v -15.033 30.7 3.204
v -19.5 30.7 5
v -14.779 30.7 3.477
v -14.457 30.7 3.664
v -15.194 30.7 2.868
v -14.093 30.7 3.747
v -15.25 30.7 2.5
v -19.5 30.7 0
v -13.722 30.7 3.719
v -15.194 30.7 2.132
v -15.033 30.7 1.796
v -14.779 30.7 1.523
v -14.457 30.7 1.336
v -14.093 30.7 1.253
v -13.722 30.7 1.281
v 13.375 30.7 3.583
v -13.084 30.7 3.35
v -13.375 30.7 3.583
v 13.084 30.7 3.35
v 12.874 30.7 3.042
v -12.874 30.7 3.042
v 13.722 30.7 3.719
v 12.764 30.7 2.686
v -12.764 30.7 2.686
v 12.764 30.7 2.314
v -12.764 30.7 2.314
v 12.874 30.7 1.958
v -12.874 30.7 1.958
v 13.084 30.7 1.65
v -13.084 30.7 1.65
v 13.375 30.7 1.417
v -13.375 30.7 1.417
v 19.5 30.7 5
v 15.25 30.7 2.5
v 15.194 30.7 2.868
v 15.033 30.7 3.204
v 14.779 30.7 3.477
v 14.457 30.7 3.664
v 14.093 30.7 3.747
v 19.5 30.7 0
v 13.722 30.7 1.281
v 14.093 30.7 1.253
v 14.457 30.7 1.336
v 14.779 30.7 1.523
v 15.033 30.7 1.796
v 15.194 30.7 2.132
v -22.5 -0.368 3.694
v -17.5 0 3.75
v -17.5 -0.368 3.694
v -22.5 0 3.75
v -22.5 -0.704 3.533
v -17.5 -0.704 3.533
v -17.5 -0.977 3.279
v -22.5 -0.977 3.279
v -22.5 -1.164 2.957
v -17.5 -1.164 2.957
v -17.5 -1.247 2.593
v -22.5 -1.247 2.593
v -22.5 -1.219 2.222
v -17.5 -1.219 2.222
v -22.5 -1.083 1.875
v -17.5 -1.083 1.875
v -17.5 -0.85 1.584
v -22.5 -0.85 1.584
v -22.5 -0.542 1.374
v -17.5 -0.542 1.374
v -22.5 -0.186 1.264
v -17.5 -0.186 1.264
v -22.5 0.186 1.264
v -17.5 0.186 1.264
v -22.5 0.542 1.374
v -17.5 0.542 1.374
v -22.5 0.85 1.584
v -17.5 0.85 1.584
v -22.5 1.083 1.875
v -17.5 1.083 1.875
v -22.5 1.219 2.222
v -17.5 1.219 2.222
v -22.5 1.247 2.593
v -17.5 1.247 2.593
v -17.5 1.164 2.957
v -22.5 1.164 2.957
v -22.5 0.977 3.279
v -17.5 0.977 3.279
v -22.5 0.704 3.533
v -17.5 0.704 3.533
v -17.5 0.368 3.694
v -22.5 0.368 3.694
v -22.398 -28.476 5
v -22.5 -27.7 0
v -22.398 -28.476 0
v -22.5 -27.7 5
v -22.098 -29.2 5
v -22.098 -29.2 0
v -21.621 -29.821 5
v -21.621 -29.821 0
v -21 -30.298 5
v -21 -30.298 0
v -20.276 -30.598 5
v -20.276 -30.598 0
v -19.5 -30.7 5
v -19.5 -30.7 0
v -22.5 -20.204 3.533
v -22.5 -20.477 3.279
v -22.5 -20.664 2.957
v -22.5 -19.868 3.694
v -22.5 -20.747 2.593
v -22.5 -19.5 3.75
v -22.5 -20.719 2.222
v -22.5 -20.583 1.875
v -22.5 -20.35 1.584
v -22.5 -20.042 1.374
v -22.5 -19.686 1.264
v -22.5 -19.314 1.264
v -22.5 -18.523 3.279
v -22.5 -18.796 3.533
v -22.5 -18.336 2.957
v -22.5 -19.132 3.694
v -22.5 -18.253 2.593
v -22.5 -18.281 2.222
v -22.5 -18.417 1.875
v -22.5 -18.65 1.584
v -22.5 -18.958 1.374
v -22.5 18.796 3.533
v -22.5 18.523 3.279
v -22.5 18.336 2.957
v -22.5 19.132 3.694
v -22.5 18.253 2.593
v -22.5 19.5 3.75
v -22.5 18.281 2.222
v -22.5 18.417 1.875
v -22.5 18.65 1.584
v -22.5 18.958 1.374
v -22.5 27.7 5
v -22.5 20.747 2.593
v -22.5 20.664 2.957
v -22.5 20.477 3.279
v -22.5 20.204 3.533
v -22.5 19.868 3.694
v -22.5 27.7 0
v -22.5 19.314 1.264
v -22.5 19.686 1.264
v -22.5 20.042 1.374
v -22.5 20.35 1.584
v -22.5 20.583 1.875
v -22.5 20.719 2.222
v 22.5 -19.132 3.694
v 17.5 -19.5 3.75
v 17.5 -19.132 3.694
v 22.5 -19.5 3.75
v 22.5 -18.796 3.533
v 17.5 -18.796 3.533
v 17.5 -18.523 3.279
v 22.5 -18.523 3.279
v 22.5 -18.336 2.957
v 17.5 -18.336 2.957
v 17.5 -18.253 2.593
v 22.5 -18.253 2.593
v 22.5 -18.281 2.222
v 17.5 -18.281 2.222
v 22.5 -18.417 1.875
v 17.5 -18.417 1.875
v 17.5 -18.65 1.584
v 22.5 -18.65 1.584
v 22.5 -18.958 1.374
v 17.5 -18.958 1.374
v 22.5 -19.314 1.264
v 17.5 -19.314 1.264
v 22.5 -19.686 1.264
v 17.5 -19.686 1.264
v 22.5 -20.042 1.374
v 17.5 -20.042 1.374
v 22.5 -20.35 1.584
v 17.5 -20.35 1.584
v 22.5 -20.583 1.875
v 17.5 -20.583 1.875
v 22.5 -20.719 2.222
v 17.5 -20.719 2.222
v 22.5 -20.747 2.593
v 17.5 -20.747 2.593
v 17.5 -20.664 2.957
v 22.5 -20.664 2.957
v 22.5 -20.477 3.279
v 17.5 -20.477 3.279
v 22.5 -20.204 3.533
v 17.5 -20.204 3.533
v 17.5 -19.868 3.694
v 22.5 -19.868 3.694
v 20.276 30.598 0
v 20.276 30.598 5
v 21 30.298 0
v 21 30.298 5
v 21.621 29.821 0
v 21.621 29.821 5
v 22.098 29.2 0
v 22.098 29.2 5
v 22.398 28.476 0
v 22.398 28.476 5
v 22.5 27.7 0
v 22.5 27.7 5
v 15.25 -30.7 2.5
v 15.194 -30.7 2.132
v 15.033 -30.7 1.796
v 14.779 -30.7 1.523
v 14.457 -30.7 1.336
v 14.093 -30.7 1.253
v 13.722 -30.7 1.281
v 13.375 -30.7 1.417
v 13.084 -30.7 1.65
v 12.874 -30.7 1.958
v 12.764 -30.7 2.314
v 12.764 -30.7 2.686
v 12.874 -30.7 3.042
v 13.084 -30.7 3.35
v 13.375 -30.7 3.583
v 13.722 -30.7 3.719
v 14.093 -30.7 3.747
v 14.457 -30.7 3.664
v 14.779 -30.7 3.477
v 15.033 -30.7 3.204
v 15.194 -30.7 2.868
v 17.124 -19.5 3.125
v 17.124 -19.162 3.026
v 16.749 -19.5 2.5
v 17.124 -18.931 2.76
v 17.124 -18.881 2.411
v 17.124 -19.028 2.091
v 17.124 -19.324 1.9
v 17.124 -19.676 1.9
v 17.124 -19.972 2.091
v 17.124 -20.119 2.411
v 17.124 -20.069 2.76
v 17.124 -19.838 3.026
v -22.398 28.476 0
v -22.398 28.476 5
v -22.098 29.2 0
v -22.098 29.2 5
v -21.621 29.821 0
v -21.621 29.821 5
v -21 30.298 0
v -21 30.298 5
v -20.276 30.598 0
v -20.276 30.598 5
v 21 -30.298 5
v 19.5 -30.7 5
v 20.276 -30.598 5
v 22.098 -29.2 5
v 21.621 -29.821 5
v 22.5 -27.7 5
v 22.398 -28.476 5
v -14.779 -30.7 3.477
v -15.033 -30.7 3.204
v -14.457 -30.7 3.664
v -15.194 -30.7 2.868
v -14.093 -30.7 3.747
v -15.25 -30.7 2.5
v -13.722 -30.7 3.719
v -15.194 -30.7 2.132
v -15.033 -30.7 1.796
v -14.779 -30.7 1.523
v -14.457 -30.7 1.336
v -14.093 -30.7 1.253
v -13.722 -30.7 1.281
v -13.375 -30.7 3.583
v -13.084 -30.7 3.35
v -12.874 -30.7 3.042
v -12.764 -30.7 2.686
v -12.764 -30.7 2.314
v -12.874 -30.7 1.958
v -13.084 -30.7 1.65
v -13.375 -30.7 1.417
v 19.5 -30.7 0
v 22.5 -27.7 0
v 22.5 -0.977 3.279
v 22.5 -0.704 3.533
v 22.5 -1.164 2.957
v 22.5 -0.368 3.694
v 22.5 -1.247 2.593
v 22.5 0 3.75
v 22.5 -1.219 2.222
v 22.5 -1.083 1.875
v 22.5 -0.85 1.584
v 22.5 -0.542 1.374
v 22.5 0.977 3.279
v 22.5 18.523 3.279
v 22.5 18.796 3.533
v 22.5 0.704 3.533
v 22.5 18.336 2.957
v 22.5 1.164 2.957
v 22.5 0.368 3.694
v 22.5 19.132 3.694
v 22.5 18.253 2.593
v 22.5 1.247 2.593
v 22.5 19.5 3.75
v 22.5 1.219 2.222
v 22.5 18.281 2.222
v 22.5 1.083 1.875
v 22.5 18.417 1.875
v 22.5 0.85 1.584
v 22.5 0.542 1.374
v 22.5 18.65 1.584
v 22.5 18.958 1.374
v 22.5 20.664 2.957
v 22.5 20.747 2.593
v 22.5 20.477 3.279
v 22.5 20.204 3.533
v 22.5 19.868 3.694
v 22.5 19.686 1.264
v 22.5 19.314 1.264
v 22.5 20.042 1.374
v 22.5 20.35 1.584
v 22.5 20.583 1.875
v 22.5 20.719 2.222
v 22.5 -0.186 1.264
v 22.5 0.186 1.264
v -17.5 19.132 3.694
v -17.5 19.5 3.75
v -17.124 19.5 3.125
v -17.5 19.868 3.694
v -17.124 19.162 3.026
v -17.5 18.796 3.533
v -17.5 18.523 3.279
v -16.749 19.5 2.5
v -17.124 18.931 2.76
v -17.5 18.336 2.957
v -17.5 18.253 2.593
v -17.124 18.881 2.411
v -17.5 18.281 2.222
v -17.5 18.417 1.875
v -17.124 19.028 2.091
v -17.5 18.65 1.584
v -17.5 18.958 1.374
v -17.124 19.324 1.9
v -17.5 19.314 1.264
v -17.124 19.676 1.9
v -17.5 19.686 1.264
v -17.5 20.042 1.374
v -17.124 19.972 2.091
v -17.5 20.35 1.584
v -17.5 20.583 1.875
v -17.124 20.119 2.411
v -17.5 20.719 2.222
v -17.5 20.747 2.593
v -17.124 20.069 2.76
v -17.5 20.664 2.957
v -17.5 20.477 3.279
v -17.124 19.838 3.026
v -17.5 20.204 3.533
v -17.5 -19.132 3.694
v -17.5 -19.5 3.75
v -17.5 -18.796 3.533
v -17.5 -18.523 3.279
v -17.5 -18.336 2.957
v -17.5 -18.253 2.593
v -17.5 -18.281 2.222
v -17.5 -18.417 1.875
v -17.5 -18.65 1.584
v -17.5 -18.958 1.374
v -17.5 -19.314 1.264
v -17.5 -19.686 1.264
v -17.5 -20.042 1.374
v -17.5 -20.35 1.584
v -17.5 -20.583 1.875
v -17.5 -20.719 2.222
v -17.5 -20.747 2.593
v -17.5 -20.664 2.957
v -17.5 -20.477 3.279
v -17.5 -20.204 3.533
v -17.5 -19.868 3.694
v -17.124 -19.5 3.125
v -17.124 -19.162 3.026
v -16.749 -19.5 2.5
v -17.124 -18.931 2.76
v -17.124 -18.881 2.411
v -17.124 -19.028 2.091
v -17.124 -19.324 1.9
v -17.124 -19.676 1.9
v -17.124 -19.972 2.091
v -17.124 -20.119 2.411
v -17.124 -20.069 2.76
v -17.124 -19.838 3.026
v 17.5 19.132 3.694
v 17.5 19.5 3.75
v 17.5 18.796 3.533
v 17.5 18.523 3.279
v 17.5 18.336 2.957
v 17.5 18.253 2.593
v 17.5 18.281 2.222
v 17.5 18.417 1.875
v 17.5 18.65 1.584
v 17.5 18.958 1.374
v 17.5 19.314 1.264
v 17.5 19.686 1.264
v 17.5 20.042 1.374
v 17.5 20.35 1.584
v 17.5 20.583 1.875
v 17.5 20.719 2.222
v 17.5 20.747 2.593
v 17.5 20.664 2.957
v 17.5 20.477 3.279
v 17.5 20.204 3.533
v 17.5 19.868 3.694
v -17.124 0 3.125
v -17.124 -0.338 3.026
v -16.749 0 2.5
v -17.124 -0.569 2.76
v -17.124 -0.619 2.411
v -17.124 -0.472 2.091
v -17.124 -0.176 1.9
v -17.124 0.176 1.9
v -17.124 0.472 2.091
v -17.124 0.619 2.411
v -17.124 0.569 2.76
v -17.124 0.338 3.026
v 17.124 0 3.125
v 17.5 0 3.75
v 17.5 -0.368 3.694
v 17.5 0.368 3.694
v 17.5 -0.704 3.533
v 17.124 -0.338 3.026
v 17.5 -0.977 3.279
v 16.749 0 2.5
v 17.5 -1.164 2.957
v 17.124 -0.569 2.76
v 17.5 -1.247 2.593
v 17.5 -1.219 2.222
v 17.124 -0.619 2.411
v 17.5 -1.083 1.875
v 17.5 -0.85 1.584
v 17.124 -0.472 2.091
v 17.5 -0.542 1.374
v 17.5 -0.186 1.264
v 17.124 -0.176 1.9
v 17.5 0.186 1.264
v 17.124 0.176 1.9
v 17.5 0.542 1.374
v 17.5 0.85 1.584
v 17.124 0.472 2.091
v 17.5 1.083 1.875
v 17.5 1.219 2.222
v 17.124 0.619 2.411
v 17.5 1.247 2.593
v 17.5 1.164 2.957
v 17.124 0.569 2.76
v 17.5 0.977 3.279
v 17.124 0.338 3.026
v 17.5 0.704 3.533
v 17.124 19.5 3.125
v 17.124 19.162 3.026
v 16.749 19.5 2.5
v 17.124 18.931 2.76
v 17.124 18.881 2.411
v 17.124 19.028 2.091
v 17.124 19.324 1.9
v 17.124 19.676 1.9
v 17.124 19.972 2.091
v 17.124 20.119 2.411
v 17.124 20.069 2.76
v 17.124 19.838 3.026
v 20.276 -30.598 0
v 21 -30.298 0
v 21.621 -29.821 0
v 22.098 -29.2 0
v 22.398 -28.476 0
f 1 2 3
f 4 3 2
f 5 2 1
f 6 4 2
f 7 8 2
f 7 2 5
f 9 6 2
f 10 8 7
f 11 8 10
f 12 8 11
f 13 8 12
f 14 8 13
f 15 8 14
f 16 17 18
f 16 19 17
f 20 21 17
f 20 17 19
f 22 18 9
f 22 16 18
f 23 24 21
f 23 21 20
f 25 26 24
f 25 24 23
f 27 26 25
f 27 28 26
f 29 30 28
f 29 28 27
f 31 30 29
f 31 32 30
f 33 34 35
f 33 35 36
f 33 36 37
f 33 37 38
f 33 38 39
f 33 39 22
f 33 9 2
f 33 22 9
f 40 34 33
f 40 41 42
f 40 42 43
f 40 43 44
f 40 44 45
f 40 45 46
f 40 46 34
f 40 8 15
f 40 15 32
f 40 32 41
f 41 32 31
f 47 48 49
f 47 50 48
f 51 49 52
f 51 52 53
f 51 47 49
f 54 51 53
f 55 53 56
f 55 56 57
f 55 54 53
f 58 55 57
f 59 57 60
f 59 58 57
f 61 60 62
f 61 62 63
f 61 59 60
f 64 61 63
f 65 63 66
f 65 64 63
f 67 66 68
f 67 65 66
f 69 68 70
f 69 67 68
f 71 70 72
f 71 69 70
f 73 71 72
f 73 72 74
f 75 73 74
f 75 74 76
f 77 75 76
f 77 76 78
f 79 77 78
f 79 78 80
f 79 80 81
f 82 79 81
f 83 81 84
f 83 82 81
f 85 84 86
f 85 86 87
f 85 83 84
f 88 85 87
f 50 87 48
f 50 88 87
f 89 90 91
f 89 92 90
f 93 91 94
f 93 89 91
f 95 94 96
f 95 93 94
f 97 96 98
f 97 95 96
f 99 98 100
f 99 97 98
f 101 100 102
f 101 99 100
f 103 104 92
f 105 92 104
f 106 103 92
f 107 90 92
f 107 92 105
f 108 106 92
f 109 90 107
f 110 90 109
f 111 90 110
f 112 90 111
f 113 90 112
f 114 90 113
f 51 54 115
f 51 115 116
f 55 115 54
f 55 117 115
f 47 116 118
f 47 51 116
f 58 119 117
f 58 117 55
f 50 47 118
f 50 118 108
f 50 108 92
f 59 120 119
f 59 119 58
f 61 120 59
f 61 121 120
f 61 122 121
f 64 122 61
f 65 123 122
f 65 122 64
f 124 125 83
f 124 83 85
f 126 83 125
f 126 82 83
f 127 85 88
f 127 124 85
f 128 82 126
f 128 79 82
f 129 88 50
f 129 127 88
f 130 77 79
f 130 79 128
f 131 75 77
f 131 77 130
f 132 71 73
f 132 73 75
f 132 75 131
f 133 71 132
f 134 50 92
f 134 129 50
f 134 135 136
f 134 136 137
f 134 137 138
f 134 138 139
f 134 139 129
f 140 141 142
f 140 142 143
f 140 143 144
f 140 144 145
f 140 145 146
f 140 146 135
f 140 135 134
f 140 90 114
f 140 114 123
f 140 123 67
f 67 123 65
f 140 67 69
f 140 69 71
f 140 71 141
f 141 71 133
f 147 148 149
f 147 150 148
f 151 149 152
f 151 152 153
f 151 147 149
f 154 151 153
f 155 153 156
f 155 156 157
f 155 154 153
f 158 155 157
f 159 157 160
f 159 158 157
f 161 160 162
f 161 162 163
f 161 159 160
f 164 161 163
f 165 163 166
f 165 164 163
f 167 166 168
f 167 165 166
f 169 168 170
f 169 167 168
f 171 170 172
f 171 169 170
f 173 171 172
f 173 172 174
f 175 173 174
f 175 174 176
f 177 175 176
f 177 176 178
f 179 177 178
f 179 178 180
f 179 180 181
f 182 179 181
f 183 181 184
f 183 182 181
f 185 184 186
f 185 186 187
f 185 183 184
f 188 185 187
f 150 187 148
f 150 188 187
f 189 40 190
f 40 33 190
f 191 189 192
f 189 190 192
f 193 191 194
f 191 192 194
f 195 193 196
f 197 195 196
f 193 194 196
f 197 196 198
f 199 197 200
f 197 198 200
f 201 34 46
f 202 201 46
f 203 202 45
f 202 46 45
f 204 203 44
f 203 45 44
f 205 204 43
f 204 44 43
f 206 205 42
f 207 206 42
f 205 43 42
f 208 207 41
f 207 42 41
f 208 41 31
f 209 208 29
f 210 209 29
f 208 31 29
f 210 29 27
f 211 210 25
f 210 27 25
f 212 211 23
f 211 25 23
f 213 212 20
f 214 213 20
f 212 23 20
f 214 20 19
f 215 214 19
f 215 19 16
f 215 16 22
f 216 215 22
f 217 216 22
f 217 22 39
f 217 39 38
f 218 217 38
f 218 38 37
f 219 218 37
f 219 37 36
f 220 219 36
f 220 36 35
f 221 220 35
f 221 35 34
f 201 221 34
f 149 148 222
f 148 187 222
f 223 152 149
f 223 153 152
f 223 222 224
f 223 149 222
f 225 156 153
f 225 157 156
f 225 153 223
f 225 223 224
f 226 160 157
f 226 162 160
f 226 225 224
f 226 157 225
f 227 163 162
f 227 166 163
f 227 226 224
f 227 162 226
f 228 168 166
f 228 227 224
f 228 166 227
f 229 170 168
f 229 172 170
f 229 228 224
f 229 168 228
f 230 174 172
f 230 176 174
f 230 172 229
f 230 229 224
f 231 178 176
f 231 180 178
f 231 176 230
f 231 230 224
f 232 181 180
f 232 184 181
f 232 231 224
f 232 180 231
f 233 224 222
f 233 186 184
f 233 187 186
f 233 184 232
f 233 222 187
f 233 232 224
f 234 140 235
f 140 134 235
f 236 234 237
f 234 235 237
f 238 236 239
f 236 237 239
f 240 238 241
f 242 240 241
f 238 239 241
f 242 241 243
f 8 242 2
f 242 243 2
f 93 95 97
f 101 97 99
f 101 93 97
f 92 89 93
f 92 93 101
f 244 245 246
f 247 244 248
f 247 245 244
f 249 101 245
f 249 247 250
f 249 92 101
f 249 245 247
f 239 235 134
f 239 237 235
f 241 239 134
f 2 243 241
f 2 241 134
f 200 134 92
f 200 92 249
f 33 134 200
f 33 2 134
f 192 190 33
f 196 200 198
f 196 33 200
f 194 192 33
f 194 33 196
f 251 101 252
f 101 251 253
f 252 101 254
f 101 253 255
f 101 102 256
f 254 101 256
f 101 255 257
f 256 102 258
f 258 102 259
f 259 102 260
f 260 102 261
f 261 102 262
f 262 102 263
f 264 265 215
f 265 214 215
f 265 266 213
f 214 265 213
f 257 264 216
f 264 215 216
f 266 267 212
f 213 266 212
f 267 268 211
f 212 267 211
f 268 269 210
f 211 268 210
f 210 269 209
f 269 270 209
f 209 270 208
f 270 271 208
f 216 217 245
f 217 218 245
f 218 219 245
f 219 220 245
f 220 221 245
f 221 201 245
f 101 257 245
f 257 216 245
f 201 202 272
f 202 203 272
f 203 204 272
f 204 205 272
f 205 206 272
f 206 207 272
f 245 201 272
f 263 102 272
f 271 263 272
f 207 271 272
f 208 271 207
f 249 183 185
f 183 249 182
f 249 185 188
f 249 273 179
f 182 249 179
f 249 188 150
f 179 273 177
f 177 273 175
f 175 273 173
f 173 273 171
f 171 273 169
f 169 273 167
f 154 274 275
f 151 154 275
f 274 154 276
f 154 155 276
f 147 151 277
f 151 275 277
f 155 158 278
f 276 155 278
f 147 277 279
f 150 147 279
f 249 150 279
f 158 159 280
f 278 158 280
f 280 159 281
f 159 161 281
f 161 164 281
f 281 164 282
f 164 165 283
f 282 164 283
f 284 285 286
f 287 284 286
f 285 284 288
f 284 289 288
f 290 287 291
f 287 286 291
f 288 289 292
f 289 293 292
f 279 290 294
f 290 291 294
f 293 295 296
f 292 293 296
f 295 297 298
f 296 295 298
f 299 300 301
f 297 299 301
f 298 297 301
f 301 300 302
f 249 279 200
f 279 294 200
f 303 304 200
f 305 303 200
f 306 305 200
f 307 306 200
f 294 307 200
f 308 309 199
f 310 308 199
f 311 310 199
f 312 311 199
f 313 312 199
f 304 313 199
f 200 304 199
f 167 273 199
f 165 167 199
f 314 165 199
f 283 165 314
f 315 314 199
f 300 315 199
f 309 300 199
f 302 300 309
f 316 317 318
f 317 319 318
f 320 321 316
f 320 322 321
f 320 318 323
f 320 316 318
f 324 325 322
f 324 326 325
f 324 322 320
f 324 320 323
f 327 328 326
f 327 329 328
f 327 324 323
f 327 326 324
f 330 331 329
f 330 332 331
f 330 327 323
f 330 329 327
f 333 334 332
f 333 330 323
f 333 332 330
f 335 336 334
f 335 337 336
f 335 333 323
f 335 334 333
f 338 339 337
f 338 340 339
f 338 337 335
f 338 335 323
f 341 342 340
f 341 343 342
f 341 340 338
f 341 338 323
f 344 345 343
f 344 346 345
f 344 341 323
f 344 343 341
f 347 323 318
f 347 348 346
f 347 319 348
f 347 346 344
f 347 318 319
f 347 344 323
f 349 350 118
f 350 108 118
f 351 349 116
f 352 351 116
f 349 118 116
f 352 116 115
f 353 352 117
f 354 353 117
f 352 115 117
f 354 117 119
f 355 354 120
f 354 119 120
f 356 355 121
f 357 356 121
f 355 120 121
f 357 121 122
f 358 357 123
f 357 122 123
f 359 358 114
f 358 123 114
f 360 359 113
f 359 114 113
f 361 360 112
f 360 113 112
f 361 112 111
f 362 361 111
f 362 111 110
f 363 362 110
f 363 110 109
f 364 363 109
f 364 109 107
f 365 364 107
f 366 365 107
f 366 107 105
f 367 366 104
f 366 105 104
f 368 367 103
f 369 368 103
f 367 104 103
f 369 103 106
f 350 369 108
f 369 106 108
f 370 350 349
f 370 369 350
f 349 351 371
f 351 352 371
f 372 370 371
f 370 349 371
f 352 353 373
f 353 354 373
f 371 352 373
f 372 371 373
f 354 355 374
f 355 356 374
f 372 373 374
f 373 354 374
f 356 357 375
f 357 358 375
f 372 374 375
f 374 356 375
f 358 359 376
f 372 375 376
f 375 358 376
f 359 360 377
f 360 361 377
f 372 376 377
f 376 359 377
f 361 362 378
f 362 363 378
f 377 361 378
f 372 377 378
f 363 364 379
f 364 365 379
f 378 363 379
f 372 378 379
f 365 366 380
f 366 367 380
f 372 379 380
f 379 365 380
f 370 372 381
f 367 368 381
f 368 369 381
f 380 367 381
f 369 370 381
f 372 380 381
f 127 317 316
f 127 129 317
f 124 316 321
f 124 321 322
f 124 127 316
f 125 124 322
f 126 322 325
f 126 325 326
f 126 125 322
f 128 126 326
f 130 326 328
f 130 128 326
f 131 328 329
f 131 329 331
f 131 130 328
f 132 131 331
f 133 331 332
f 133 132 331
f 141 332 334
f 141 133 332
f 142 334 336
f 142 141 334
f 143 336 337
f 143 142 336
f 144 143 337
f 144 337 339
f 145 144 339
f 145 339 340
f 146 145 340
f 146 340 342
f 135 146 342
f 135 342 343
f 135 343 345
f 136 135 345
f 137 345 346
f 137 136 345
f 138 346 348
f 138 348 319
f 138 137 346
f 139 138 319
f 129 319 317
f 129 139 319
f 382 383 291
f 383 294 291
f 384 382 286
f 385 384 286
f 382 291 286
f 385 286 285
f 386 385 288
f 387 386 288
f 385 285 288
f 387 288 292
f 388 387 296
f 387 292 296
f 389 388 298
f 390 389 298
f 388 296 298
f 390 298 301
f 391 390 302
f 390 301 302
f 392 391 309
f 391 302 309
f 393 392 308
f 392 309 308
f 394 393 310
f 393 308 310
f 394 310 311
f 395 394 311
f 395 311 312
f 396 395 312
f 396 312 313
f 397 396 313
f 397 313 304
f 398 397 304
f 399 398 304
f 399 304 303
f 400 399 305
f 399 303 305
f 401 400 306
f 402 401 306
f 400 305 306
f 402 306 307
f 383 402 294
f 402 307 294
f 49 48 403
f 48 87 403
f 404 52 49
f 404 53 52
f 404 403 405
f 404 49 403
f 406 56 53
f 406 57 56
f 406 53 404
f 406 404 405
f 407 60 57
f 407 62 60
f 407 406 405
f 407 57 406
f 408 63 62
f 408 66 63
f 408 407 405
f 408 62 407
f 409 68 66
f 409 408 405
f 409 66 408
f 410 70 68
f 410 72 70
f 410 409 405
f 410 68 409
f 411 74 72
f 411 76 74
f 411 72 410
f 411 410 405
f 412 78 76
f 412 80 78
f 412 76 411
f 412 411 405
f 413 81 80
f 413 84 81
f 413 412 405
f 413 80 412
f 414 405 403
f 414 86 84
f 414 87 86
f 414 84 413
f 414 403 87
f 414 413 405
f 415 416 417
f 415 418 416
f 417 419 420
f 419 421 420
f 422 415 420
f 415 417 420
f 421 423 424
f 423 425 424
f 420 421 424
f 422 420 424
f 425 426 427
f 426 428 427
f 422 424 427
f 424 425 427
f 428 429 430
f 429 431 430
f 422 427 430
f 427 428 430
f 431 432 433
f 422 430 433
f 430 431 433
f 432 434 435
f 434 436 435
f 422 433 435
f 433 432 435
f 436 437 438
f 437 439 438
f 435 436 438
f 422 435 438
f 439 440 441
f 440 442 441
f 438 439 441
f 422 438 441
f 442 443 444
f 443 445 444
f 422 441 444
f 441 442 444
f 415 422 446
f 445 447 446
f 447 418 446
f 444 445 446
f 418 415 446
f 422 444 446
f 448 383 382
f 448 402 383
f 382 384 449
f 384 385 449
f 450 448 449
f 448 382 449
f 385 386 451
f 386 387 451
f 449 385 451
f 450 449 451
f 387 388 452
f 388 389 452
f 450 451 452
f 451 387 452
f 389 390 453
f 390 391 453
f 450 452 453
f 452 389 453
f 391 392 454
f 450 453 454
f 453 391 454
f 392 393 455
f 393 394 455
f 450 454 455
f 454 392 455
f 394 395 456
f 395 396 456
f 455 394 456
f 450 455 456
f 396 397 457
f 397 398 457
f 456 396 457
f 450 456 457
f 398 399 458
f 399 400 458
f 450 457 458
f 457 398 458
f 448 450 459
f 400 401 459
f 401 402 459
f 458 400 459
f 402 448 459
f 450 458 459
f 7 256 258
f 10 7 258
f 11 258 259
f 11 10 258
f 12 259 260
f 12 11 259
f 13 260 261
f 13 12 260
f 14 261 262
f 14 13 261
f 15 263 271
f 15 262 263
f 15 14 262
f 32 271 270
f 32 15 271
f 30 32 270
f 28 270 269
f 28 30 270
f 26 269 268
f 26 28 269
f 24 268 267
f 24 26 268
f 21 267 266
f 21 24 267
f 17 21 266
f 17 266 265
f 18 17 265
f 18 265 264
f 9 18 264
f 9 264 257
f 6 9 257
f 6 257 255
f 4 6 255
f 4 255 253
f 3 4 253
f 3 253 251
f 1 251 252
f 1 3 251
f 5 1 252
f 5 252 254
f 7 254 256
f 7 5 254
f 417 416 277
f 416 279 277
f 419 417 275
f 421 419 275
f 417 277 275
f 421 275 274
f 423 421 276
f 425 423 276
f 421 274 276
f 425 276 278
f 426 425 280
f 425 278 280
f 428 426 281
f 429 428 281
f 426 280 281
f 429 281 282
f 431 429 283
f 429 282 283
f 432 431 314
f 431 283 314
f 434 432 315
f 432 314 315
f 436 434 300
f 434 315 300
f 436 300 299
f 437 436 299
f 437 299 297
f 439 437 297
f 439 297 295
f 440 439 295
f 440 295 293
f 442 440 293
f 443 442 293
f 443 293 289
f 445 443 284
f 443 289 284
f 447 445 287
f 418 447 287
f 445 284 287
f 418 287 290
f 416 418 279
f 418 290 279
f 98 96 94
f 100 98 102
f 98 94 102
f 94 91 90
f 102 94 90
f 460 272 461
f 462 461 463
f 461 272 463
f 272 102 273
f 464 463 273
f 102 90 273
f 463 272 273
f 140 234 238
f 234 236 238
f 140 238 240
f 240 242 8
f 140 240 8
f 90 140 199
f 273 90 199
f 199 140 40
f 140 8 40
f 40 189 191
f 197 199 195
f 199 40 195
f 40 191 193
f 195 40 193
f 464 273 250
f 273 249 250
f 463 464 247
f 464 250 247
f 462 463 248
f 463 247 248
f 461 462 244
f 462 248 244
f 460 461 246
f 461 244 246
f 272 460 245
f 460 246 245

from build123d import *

# Parameters (mm, degrees)
SKETCH_1_W         = 45
SKETCH_1_H         = 61.4
EXTRUDE_1_DEPTH    = 5
HOLE_WIZARD_M3_3_D = 2.5
HOLE_WIZARD_M3_4_D = 2.5
FILLET_1_R         = 3


with BuildPart() as part:
    # 草图1 → 凸台-拉伸1 (new body)
    with BuildSketch(Plane.XY):
        Rectangle(SKETCH_1_W, SKETCH_1_H)
    extrude(amount=EXTRUDE_1_DEPTH)

    # 草图3 → M3 螺纹孔1 (revolve, cut)
    with BuildSketch(Plane(origin=(-22.5, 0, 2.5), x_dir=(0, 0, 1), z_dir=(0, 1, 0))):
        Polygon((0, 0), (0, 5.751075774), (1.25, 5), (1.25, 0), align=None)
    hole_wizard_m3_1 = revolve(axis=Axis((-28.85, 0, 2.5), (1, 0, 0)), mode=Mode.SUBTRACT)

    # 草图5 → M3 螺纹孔2 (revolve, cut)
    with BuildSketch(Plane(origin=(-22.5, 19.5, 2.5), x_dir=(0, 0, 1), z_dir=(0, 1, 0))):
        Polygon((0, 0), (0, 5.751075774), (1.25, 5), (1.25, 0), align=None)
    hole_wizard_m3_2 = revolve(axis=Axis((-28.85, 19.5, 2.5), (1, 0, 0)), mode=Mode.SUBTRACT)

    # 镜向1: M3 螺纹孔2 across plane
    add(hole_wizard_m3_2.mirror(Plane.ZX), mode=Mode.SUBTRACT)

    # M3 螺纹孔3 (through all)
    with Locations(Plane(origin=(0, -30.7, 0), x_dir=(-1, 0, 0), z_dir=(0, -1, 0))):
        with Locations((-14, -2.5)):
            hole_wizard_m3_3 = Hole(HOLE_WIZARD_M3_3_D / 2)

    # 镜向2: M3 螺纹孔3 across plane
    add(hole_wizard_m3_3.mirror(Plane(origin=(0, 0, 0), x_dir=(0, 0, 1), z_dir=(1, 0, 0))), mode=Mode.SUBTRACT)

    # 镜向3: M3 螺纹孔2, M3 螺纹孔1 across plane
    add(hole_wizard_m3_2.mirror(Plane(origin=(0, 0, 0), x_dir=(0, 0, 1), z_dir=(1, 0, 0))), mode=Mode.SUBTRACT)
    add(hole_wizard_m3_1.mirror(Plane(origin=(0, 0, 0), x_dir=(0, 0, 1), z_dir=(1, 0, 0))), mode=Mode.SUBTRACT)

    # 镜向3 copy 1 sketch → 镜向3 copy 1 (revolve, cut)
    with BuildSketch(Plane(origin=(22.5, -19.5, 2.5), x_dir=(0, 0, 1), z_dir=(0, -1, 0))):
        Polygon((0, 0), (0, 5.751075774), (1.25, 5), (1.25, 0), align=None)
    revolve(axis=Axis((28.85, -19.5, 2.5), (-1, 0, 0)), mode=Mode.SUBTRACT)

    # M3 螺纹孔4 (through all)
    with Locations(Plane(origin=(0, 30.7, 0), x_dir=(1, 0, 0), z_dir=(0, 1, 0))):
        with Locations((-14, -2.5), (14, -2.5)):
            Hole(HOLE_WIZARD_M3_4_D / 2)

    # 圆角1
    fillet_1_edges = [part.edges().sort_by_distance(p)[0] for p in [
        (22.5, -30.7, 2.5),
        (-22.5, -30.7, 2.5),
        (-22.5, 30.7, 2.5),
        (22.5, 30.7, 2.5),
    ]]
    fillet(fillet_1_edges, radius=FILLET_1_R)


solid = part.part
